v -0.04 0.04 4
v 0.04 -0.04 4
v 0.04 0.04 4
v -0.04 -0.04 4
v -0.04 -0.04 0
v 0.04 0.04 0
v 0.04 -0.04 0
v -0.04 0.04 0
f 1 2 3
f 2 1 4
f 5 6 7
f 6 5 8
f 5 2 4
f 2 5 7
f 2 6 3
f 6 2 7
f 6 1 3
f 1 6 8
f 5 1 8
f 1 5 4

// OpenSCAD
// Shed shell kit: corner inner. See lib/lodge_kit.scad.
include <lib/lodge_kit.scad>
kind = "shed";
corner_inner();
